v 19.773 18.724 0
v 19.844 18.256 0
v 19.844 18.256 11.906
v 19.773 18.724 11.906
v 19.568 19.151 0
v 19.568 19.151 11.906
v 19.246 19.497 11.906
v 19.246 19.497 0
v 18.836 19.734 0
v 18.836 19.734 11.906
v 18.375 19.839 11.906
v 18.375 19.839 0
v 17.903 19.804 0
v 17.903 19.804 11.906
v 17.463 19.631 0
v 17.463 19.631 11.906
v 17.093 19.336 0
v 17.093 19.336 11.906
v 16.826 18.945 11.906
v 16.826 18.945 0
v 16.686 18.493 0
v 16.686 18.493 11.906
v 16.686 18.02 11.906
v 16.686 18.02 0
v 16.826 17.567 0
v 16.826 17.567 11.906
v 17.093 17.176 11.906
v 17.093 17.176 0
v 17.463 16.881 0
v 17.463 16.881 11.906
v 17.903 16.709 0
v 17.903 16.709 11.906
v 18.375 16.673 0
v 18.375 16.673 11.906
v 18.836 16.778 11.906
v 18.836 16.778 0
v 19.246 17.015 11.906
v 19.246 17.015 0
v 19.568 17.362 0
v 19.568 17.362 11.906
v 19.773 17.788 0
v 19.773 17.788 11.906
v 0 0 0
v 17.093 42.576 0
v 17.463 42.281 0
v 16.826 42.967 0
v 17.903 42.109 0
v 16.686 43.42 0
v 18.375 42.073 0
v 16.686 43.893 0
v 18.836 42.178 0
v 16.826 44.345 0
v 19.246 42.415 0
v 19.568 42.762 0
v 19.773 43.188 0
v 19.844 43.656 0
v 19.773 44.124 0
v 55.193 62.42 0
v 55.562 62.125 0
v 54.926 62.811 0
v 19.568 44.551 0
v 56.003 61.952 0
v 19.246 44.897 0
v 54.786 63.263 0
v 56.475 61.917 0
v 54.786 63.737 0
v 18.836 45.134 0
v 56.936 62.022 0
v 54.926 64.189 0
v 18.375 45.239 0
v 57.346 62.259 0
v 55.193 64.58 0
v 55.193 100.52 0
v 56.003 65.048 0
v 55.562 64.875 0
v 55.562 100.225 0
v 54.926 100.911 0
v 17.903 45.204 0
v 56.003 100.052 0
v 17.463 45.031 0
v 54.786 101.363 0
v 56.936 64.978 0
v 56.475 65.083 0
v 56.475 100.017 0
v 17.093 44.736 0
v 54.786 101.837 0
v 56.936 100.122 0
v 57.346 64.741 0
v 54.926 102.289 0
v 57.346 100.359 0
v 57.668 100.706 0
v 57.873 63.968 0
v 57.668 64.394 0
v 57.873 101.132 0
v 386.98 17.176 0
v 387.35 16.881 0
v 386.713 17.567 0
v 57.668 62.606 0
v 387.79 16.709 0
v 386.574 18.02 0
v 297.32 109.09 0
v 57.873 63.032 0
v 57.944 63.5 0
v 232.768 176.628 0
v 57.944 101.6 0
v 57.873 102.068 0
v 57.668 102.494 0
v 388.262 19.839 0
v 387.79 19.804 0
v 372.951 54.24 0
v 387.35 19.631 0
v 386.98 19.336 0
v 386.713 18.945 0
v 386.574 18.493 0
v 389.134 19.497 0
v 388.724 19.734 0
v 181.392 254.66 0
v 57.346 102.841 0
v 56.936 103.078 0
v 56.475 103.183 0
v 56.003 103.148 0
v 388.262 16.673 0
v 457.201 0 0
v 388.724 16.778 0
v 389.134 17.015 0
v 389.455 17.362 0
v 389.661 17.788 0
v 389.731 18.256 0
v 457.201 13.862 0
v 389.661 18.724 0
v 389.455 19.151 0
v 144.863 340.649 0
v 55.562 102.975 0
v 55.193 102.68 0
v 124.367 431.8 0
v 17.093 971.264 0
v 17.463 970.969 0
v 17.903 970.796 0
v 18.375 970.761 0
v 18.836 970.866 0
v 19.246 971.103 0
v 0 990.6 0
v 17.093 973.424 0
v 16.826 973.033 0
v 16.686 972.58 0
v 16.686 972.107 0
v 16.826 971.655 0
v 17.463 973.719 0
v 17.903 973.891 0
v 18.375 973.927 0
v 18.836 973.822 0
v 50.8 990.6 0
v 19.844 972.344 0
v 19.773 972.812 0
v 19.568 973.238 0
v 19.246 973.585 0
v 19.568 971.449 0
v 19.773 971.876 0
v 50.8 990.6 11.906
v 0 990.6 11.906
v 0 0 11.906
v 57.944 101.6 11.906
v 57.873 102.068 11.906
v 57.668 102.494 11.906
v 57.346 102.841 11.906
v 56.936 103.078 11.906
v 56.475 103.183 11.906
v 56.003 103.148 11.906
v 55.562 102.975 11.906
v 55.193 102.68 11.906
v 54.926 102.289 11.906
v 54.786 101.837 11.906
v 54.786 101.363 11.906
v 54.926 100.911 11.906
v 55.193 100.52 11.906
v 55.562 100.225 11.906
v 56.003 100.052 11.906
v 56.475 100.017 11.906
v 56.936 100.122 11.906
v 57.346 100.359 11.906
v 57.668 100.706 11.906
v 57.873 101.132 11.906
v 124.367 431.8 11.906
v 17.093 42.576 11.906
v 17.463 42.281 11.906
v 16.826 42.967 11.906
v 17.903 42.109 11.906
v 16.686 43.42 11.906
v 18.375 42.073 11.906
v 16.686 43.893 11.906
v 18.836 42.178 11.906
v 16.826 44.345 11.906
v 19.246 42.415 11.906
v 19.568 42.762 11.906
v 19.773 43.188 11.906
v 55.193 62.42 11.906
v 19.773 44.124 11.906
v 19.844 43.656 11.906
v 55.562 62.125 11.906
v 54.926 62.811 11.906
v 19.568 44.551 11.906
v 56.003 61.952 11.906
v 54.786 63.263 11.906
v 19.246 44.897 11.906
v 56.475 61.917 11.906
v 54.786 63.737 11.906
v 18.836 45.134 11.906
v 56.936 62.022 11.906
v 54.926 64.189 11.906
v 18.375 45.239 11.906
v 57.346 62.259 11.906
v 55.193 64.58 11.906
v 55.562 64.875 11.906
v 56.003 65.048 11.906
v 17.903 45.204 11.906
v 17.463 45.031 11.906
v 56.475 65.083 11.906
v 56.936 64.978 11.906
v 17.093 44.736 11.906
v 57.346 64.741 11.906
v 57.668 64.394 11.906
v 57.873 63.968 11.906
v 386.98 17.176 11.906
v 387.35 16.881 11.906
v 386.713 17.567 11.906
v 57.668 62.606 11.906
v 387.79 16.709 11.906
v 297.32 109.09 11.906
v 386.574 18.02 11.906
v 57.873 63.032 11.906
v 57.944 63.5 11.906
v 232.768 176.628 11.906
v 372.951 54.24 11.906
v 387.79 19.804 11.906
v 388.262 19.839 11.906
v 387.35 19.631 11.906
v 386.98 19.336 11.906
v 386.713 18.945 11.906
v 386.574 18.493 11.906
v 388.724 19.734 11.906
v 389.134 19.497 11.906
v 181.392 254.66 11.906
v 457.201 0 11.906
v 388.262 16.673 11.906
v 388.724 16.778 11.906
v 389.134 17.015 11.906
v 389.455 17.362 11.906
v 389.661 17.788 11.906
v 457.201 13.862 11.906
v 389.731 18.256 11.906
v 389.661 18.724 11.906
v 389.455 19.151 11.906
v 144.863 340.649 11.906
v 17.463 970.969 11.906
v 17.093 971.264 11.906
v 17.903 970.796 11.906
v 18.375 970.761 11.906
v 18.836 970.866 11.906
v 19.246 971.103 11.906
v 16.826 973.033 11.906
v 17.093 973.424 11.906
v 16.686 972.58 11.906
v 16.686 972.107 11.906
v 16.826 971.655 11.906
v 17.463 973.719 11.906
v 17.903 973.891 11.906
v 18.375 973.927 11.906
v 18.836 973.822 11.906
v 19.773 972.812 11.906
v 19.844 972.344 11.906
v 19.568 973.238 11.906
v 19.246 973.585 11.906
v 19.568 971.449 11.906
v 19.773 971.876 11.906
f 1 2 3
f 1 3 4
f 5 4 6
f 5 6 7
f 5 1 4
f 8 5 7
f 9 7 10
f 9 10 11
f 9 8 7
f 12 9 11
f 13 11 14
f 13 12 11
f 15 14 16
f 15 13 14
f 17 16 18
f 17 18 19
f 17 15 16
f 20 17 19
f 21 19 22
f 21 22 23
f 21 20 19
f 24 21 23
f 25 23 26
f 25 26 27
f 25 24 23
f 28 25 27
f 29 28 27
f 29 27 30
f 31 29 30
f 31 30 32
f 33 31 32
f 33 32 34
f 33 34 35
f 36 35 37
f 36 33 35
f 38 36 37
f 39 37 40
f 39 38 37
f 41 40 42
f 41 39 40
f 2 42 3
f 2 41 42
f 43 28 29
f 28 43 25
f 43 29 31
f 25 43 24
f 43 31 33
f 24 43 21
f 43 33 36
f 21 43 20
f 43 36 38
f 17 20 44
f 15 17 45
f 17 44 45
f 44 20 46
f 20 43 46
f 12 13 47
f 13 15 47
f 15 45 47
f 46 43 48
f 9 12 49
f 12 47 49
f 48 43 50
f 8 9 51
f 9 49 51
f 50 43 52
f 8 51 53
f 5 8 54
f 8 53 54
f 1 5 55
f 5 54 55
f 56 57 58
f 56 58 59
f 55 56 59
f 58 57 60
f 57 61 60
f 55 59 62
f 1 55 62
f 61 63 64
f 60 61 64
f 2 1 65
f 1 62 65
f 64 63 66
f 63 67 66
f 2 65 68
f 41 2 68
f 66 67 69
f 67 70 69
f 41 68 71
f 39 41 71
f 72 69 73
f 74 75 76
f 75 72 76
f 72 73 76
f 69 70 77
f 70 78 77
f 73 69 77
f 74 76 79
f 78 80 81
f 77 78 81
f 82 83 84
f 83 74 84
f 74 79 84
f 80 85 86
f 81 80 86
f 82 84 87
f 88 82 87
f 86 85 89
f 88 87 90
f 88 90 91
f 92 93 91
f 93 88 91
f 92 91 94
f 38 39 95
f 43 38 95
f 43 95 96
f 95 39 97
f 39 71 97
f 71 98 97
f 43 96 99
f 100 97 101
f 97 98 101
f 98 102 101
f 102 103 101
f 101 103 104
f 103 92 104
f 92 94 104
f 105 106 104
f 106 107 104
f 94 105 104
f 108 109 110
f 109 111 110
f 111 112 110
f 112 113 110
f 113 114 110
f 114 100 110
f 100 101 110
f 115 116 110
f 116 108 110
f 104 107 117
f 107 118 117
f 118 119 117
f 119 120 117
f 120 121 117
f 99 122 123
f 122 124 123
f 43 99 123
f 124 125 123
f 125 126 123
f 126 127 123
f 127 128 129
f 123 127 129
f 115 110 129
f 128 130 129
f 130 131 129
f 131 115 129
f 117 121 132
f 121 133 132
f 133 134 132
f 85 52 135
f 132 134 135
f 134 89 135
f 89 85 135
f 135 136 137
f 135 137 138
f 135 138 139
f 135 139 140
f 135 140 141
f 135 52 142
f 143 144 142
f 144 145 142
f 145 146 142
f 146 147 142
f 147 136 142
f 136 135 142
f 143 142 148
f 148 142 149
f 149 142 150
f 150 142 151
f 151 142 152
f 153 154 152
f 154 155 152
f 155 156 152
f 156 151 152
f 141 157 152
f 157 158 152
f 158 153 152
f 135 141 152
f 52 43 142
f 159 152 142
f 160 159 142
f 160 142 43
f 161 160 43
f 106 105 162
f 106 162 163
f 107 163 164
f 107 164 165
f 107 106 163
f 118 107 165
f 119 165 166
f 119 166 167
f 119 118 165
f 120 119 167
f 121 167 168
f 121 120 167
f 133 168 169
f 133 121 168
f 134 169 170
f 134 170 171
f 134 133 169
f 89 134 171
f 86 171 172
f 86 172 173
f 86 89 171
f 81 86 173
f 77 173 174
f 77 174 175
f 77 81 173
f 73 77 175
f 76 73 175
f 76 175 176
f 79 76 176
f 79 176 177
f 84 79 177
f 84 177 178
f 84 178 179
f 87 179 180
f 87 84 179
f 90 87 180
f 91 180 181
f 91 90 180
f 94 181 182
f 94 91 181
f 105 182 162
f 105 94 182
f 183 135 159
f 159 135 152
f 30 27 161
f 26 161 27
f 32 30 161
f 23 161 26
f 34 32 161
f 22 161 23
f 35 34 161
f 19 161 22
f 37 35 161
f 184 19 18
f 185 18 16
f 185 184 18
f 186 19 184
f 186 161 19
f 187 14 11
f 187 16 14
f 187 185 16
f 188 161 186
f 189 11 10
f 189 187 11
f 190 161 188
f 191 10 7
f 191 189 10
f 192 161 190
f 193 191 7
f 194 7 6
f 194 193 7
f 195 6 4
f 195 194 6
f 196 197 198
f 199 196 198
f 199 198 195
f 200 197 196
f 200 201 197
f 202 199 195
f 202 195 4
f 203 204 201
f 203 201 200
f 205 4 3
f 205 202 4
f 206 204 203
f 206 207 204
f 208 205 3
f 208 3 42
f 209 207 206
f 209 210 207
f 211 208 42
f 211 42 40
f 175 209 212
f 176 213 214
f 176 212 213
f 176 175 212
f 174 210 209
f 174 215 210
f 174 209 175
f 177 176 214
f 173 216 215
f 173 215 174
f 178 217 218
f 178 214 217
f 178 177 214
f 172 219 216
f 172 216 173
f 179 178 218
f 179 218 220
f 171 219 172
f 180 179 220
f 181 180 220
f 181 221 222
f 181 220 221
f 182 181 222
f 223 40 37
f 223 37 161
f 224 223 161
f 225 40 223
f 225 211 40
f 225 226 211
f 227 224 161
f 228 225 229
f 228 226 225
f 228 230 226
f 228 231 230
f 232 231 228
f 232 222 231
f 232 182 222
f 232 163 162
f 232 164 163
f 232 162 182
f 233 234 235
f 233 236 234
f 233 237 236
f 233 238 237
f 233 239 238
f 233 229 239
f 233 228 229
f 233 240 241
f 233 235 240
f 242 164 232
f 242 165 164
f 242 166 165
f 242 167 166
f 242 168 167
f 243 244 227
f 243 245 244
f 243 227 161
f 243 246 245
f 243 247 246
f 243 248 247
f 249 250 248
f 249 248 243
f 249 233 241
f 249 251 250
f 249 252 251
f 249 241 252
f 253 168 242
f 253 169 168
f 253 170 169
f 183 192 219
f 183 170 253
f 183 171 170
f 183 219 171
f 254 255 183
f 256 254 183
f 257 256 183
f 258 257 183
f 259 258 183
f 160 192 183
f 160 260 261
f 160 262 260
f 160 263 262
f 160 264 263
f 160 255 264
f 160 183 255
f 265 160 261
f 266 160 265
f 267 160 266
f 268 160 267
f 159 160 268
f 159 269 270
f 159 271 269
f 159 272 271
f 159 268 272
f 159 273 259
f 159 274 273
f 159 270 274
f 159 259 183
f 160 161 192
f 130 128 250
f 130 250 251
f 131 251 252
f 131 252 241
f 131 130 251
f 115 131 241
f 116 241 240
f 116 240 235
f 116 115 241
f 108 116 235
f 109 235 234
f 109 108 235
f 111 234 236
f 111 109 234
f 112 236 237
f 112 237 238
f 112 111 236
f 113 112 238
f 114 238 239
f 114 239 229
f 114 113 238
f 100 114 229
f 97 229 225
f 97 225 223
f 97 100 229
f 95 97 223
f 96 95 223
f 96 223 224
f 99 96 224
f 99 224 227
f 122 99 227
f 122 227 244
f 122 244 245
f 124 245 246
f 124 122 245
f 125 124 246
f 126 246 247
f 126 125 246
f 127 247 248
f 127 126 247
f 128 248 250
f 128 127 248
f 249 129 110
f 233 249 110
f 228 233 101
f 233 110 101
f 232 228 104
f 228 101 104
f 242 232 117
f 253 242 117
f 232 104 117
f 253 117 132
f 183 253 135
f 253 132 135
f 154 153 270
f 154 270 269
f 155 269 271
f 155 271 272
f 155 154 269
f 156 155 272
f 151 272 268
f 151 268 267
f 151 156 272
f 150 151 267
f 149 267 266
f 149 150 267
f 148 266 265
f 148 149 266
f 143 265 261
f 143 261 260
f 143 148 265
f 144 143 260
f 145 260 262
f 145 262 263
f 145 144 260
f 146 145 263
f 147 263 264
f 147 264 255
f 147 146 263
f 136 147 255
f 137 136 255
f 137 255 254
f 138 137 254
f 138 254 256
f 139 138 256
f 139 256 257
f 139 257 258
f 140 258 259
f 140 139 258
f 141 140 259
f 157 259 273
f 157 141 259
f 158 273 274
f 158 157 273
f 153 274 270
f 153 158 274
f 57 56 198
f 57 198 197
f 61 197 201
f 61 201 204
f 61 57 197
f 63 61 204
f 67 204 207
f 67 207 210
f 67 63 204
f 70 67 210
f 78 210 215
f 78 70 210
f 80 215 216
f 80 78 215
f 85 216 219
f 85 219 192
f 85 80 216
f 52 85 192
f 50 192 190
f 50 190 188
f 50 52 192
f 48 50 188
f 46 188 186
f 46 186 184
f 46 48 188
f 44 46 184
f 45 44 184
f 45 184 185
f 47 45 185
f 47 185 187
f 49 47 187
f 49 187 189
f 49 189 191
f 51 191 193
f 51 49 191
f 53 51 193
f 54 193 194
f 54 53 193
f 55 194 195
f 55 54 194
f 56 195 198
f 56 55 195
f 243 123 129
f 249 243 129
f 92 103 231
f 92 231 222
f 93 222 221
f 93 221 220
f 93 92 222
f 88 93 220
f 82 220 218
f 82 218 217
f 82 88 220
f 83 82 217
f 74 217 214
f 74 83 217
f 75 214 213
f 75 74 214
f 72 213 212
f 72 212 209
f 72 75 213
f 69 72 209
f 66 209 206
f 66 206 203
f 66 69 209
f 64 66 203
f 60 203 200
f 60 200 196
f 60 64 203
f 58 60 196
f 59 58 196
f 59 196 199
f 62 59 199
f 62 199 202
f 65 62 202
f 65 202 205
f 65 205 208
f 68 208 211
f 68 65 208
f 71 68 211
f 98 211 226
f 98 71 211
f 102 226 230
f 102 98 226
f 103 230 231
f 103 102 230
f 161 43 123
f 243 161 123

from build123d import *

# Parameters (mm, degrees)
SKETCH1_R           = 1.5875
BOSS_EXTRUDE1_DEPTH = 11.90625


with BuildPart() as part:
    # Sketch1 → Boss-Extrude1 (new body)
    with BuildSketch(Plane.XY):
        with BuildLine():
            Line((0, 990.6), (0, 0))
            Line((0, 0), (457.201, 0))
            Line((457.201, 0), (457.201, 13.862038208))
            ThreePointArc((457.201, 13.862038208), (232.767577124, 176.628269142), (124.367415652, 431.8))
            Line((124.367415652, 431.8), (50.8, 990.6))
            Line((50.8, 990.6), (0, 990.6))
        make_face()
        with Locations((18.25625, 18.25625)):
            Circle(SKETCH1_R, mode=Mode.SUBTRACT)
        with Locations((18.25625, 43.65625)):
            Circle(SKETCH1_R, mode=Mode.SUBTRACT)
        with Locations((56.35625, 63.5)):
            Circle(SKETCH1_R, mode=Mode.SUBTRACT)
        with Locations((56.35625, 101.6)):
            Circle(SKETCH1_R, mode=Mode.SUBTRACT)
        with Locations((388.14375, 18.25625)):
            Circle(SKETCH1_R, mode=Mode.SUBTRACT)
        with Locations((18.25625, 972.34375)):
            Circle(SKETCH1_R, mode=Mode.SUBTRACT)
    extrude(amount=BOSS_EXTRUDE1_DEPTH)


solid = part.part
